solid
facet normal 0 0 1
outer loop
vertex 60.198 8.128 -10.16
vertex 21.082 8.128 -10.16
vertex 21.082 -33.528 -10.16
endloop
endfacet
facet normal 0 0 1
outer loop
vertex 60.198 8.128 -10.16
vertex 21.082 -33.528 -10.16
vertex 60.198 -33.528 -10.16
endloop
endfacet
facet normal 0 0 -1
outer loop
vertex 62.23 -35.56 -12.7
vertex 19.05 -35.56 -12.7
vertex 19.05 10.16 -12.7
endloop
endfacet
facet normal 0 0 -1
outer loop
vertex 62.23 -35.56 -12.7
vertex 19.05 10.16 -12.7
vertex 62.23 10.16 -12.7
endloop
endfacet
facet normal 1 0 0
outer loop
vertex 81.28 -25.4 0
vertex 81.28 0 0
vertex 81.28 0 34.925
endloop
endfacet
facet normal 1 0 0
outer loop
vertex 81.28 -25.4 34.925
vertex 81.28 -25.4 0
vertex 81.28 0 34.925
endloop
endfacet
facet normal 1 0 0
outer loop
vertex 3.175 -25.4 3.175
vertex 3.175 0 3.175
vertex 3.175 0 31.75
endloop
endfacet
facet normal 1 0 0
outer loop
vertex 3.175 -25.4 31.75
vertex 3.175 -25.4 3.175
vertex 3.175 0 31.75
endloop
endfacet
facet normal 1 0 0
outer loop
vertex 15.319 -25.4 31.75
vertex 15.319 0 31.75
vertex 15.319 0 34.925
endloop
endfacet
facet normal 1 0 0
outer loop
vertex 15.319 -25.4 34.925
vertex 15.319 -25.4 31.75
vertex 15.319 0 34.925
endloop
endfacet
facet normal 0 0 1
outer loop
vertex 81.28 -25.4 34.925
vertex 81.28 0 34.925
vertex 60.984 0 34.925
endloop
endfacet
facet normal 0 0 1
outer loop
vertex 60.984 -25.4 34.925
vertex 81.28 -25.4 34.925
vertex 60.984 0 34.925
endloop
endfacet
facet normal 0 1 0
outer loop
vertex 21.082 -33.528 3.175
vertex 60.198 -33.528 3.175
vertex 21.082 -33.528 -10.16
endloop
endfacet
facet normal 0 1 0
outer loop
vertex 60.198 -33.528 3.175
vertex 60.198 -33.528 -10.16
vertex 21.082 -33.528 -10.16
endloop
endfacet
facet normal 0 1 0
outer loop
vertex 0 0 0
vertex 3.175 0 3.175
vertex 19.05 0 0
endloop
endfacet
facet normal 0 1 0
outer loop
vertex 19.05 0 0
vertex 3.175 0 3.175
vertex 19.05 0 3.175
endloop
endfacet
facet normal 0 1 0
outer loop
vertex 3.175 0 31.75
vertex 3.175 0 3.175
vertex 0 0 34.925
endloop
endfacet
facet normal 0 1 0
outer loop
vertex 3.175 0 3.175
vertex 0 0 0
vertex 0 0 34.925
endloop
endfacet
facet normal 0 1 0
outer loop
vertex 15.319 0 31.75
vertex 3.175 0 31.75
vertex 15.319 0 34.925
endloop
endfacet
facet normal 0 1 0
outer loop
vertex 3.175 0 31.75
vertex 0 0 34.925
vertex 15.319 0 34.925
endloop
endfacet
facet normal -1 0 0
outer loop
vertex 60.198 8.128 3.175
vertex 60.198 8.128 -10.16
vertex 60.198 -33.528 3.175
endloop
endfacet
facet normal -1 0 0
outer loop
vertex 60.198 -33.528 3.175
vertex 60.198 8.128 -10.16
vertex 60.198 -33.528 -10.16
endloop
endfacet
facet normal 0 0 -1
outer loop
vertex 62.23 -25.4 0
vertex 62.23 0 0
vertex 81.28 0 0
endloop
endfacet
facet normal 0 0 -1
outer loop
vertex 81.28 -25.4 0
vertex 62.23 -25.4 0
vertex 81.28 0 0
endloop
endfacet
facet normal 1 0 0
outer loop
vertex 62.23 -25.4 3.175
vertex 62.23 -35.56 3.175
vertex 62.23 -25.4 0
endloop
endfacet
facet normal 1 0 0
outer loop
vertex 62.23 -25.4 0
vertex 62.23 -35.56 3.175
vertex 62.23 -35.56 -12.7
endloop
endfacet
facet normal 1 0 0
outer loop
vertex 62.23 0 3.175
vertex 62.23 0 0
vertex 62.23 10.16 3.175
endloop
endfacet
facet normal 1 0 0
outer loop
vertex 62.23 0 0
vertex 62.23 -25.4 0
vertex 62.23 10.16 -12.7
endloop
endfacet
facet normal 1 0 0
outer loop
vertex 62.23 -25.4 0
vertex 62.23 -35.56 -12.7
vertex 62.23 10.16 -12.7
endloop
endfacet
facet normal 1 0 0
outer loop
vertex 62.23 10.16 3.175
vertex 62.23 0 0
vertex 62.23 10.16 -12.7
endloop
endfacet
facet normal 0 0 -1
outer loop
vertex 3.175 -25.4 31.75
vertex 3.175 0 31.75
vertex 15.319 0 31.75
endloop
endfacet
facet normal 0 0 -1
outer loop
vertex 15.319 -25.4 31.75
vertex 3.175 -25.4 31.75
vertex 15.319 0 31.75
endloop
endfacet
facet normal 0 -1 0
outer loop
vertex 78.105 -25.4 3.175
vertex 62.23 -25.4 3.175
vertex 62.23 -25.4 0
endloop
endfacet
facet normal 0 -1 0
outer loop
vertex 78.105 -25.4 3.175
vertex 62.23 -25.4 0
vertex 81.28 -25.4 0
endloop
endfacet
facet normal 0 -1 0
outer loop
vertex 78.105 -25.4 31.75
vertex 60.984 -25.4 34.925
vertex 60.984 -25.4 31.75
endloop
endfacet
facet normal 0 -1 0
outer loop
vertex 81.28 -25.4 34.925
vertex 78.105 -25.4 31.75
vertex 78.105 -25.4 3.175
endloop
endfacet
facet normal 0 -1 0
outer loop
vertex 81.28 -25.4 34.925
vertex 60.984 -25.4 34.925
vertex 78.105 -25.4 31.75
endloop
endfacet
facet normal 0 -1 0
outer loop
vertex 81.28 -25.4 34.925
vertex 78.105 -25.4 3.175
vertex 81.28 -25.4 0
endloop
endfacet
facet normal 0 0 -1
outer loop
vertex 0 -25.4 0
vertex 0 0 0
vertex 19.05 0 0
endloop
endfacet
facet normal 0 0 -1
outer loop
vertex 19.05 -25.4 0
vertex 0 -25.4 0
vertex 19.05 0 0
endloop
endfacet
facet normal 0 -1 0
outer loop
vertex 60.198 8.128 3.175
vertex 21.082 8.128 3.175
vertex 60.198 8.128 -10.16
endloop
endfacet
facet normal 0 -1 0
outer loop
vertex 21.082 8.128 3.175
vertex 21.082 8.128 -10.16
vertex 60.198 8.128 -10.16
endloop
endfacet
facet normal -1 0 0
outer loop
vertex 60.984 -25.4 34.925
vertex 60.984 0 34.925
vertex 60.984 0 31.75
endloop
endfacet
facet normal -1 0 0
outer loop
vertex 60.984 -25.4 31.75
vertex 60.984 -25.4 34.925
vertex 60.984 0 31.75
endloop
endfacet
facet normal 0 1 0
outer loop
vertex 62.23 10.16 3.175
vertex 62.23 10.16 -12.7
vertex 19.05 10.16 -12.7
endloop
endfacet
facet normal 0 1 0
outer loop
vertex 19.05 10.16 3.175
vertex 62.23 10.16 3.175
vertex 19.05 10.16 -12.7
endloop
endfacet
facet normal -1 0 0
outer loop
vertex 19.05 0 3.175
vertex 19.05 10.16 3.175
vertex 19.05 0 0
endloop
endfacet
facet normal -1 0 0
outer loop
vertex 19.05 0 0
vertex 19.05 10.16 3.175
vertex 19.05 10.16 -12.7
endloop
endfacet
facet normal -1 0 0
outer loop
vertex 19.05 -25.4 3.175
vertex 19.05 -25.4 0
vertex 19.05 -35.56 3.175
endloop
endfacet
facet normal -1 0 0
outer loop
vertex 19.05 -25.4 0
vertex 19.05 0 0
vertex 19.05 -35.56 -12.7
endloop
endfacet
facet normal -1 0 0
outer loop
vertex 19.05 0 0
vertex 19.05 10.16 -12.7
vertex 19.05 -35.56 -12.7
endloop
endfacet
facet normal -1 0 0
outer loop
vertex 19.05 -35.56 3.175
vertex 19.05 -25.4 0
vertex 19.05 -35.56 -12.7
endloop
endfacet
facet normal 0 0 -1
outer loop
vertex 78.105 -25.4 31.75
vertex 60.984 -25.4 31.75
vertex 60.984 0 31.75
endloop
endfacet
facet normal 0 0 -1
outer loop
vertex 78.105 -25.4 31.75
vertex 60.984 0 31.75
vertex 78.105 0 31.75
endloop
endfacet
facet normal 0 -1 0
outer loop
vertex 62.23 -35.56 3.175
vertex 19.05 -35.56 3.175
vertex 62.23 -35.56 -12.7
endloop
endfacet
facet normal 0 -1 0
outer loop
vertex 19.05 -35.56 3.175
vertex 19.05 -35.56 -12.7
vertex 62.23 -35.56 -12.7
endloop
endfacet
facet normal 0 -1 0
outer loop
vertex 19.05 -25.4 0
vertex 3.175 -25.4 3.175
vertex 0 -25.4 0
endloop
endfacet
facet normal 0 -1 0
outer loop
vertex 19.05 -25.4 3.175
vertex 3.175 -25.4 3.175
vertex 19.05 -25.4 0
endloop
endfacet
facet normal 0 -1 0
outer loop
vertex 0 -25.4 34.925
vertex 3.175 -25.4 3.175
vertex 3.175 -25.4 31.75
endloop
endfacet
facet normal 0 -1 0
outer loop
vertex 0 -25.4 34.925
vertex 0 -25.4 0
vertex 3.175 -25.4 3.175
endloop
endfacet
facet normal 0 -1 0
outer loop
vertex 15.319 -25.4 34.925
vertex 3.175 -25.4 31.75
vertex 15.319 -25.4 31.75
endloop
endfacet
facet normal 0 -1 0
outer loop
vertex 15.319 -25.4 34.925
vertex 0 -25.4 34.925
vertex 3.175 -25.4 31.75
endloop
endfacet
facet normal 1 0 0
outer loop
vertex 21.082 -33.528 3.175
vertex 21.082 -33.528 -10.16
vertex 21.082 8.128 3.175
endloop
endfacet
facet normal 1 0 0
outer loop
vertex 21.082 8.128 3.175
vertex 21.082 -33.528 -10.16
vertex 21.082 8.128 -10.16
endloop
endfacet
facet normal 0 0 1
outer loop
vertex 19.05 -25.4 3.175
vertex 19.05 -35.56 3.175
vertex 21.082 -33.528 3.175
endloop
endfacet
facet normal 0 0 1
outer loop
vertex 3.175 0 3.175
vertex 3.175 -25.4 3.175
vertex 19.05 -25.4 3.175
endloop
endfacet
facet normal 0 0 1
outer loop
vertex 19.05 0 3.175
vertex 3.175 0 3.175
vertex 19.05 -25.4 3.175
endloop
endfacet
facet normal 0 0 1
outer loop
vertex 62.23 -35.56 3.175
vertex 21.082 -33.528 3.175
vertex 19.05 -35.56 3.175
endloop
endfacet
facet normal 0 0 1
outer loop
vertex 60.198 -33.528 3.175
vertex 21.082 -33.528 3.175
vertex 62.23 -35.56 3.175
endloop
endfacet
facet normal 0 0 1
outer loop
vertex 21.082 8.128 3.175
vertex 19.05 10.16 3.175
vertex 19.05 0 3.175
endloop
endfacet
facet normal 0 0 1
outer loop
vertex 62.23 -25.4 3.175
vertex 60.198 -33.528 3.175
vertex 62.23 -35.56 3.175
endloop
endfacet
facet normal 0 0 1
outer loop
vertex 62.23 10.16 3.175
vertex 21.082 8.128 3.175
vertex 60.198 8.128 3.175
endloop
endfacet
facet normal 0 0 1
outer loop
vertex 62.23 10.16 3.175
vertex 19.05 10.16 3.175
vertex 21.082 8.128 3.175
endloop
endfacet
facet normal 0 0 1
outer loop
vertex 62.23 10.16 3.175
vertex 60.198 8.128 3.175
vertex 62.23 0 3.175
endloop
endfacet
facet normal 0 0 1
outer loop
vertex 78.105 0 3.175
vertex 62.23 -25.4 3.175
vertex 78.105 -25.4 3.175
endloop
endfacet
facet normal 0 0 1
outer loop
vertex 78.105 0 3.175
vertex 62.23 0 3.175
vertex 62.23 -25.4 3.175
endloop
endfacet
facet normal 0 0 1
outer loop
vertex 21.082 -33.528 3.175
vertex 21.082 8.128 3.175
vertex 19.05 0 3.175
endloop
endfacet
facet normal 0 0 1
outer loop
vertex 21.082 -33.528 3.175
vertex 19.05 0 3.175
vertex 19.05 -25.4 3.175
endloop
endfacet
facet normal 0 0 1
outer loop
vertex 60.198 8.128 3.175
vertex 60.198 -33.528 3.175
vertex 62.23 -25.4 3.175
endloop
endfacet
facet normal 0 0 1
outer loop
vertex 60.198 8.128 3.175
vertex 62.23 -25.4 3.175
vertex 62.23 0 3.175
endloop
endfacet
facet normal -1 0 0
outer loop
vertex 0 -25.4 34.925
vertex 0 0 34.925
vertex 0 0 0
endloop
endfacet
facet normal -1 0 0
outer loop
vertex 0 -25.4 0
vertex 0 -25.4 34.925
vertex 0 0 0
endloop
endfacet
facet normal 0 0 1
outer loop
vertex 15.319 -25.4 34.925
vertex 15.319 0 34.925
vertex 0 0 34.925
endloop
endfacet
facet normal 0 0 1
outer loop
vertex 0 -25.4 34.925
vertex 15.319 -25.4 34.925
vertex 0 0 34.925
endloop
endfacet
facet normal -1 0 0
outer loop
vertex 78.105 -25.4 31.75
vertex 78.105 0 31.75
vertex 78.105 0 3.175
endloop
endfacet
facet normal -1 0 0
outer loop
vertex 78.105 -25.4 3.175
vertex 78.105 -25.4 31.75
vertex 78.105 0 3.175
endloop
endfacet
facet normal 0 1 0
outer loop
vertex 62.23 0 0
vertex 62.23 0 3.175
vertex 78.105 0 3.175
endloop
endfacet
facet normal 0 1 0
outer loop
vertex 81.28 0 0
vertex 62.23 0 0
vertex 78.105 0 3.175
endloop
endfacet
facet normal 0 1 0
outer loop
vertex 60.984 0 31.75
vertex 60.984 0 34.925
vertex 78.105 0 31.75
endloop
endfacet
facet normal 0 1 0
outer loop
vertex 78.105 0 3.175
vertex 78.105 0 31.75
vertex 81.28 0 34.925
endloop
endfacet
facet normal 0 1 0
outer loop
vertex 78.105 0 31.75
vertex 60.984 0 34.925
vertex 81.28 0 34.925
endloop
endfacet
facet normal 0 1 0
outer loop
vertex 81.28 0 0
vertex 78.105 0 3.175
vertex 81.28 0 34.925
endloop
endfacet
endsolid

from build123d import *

# Parameters (mm, degrees)
F1_DEPTH  = 25.4
F2_W      = 43.18
F2_H      = 45.72
F2_W_2    = 39.116
F2_H_2    = 41.656
F3_DEPTH  = 10.16
F4_W      = 43.18
F4_H      = 45.72
F5_DEPTH  = 2.54
F6_W      = 39.116
F6_H      = 3.175
F7_DEPTH  = 25.4
F9_DEPTH  = 3.175
F11_DEPTH = 3.175


with BuildPart() as f1:
    # F0 (on Front) → F1 (new body)
    with BuildSketch(Plane.XZ):
        Polygon((0, 34.925), (0, 0), (81.28, 0), (81.28, 34.925), (60.98439, 34.925), (60.98439, 31.75), (78.105, 31.75), (78.105, 3.175), (3.175, 3.175), (3.175, 31.75), (15.319279, 31.75), (15.319279, 34.925), align=None)
    extrude(amount=F1_DEPTH)

    # F2 (on face) → F3 (join)
    with BuildSketch(Plane(origin=(0, 0, 0), x_dir=(1, 0, 0), z_dir=(0, 0, -1))):
        with Locations((40.64, 12.7)):
            Rectangle(F2_W, F2_H)
        with Locations((40.64, 12.7)):
            Rectangle(F2_W_2, F2_H_2, mode=Mode.SUBTRACT)
    extrude(amount=F3_DEPTH)

    # F4 (on face) → F5 (join)
    with BuildSketch(Plane(origin=(0, 0, -10.16), x_dir=(1, 0, 0), z_dir=(0, 0, -1))):
        with Locations((40.64, 12.7)):
            Rectangle(F4_W, F4_H)
    extrude(amount=F5_DEPTH)

    # F6 (on face) → F7 (cut)
    with BuildSketch(Plane(origin=(0, 0, 0), x_dir=(-1, 0, 0), z_dir=(0, 1, 0))):
        with Locations((-40.64, 1.5875)):
            Rectangle(F6_W, F6_H)
    extrude(amount=-F7_DEPTH, mode=Mode.SUBTRACT)

    # F8 (on face) → F9 (join)
    with BuildSketch(Plane.XY):
        Polygon((19.05, 10.16), (19.05, 0), (21.082, 0), (21.082, 8.128), (60.198, 8.128), (60.198, 0), (62.23, 0), (62.23, 10.16), align=None)
    extrude(amount=F9_DEPTH)

    # F10 (on face) → F11 (join)
    with BuildSketch(Plane.XY):
        Polygon((21.082, -25.4), (19.05, -25.4), (19.05, -35.56), (62.23, -35.56), (62.23, -25.4), (60.198, -25.4), (60.198, -33.528), (21.082, -33.528), align=None)
    extrude(amount=F11_DEPTH)


solid = f1.part
